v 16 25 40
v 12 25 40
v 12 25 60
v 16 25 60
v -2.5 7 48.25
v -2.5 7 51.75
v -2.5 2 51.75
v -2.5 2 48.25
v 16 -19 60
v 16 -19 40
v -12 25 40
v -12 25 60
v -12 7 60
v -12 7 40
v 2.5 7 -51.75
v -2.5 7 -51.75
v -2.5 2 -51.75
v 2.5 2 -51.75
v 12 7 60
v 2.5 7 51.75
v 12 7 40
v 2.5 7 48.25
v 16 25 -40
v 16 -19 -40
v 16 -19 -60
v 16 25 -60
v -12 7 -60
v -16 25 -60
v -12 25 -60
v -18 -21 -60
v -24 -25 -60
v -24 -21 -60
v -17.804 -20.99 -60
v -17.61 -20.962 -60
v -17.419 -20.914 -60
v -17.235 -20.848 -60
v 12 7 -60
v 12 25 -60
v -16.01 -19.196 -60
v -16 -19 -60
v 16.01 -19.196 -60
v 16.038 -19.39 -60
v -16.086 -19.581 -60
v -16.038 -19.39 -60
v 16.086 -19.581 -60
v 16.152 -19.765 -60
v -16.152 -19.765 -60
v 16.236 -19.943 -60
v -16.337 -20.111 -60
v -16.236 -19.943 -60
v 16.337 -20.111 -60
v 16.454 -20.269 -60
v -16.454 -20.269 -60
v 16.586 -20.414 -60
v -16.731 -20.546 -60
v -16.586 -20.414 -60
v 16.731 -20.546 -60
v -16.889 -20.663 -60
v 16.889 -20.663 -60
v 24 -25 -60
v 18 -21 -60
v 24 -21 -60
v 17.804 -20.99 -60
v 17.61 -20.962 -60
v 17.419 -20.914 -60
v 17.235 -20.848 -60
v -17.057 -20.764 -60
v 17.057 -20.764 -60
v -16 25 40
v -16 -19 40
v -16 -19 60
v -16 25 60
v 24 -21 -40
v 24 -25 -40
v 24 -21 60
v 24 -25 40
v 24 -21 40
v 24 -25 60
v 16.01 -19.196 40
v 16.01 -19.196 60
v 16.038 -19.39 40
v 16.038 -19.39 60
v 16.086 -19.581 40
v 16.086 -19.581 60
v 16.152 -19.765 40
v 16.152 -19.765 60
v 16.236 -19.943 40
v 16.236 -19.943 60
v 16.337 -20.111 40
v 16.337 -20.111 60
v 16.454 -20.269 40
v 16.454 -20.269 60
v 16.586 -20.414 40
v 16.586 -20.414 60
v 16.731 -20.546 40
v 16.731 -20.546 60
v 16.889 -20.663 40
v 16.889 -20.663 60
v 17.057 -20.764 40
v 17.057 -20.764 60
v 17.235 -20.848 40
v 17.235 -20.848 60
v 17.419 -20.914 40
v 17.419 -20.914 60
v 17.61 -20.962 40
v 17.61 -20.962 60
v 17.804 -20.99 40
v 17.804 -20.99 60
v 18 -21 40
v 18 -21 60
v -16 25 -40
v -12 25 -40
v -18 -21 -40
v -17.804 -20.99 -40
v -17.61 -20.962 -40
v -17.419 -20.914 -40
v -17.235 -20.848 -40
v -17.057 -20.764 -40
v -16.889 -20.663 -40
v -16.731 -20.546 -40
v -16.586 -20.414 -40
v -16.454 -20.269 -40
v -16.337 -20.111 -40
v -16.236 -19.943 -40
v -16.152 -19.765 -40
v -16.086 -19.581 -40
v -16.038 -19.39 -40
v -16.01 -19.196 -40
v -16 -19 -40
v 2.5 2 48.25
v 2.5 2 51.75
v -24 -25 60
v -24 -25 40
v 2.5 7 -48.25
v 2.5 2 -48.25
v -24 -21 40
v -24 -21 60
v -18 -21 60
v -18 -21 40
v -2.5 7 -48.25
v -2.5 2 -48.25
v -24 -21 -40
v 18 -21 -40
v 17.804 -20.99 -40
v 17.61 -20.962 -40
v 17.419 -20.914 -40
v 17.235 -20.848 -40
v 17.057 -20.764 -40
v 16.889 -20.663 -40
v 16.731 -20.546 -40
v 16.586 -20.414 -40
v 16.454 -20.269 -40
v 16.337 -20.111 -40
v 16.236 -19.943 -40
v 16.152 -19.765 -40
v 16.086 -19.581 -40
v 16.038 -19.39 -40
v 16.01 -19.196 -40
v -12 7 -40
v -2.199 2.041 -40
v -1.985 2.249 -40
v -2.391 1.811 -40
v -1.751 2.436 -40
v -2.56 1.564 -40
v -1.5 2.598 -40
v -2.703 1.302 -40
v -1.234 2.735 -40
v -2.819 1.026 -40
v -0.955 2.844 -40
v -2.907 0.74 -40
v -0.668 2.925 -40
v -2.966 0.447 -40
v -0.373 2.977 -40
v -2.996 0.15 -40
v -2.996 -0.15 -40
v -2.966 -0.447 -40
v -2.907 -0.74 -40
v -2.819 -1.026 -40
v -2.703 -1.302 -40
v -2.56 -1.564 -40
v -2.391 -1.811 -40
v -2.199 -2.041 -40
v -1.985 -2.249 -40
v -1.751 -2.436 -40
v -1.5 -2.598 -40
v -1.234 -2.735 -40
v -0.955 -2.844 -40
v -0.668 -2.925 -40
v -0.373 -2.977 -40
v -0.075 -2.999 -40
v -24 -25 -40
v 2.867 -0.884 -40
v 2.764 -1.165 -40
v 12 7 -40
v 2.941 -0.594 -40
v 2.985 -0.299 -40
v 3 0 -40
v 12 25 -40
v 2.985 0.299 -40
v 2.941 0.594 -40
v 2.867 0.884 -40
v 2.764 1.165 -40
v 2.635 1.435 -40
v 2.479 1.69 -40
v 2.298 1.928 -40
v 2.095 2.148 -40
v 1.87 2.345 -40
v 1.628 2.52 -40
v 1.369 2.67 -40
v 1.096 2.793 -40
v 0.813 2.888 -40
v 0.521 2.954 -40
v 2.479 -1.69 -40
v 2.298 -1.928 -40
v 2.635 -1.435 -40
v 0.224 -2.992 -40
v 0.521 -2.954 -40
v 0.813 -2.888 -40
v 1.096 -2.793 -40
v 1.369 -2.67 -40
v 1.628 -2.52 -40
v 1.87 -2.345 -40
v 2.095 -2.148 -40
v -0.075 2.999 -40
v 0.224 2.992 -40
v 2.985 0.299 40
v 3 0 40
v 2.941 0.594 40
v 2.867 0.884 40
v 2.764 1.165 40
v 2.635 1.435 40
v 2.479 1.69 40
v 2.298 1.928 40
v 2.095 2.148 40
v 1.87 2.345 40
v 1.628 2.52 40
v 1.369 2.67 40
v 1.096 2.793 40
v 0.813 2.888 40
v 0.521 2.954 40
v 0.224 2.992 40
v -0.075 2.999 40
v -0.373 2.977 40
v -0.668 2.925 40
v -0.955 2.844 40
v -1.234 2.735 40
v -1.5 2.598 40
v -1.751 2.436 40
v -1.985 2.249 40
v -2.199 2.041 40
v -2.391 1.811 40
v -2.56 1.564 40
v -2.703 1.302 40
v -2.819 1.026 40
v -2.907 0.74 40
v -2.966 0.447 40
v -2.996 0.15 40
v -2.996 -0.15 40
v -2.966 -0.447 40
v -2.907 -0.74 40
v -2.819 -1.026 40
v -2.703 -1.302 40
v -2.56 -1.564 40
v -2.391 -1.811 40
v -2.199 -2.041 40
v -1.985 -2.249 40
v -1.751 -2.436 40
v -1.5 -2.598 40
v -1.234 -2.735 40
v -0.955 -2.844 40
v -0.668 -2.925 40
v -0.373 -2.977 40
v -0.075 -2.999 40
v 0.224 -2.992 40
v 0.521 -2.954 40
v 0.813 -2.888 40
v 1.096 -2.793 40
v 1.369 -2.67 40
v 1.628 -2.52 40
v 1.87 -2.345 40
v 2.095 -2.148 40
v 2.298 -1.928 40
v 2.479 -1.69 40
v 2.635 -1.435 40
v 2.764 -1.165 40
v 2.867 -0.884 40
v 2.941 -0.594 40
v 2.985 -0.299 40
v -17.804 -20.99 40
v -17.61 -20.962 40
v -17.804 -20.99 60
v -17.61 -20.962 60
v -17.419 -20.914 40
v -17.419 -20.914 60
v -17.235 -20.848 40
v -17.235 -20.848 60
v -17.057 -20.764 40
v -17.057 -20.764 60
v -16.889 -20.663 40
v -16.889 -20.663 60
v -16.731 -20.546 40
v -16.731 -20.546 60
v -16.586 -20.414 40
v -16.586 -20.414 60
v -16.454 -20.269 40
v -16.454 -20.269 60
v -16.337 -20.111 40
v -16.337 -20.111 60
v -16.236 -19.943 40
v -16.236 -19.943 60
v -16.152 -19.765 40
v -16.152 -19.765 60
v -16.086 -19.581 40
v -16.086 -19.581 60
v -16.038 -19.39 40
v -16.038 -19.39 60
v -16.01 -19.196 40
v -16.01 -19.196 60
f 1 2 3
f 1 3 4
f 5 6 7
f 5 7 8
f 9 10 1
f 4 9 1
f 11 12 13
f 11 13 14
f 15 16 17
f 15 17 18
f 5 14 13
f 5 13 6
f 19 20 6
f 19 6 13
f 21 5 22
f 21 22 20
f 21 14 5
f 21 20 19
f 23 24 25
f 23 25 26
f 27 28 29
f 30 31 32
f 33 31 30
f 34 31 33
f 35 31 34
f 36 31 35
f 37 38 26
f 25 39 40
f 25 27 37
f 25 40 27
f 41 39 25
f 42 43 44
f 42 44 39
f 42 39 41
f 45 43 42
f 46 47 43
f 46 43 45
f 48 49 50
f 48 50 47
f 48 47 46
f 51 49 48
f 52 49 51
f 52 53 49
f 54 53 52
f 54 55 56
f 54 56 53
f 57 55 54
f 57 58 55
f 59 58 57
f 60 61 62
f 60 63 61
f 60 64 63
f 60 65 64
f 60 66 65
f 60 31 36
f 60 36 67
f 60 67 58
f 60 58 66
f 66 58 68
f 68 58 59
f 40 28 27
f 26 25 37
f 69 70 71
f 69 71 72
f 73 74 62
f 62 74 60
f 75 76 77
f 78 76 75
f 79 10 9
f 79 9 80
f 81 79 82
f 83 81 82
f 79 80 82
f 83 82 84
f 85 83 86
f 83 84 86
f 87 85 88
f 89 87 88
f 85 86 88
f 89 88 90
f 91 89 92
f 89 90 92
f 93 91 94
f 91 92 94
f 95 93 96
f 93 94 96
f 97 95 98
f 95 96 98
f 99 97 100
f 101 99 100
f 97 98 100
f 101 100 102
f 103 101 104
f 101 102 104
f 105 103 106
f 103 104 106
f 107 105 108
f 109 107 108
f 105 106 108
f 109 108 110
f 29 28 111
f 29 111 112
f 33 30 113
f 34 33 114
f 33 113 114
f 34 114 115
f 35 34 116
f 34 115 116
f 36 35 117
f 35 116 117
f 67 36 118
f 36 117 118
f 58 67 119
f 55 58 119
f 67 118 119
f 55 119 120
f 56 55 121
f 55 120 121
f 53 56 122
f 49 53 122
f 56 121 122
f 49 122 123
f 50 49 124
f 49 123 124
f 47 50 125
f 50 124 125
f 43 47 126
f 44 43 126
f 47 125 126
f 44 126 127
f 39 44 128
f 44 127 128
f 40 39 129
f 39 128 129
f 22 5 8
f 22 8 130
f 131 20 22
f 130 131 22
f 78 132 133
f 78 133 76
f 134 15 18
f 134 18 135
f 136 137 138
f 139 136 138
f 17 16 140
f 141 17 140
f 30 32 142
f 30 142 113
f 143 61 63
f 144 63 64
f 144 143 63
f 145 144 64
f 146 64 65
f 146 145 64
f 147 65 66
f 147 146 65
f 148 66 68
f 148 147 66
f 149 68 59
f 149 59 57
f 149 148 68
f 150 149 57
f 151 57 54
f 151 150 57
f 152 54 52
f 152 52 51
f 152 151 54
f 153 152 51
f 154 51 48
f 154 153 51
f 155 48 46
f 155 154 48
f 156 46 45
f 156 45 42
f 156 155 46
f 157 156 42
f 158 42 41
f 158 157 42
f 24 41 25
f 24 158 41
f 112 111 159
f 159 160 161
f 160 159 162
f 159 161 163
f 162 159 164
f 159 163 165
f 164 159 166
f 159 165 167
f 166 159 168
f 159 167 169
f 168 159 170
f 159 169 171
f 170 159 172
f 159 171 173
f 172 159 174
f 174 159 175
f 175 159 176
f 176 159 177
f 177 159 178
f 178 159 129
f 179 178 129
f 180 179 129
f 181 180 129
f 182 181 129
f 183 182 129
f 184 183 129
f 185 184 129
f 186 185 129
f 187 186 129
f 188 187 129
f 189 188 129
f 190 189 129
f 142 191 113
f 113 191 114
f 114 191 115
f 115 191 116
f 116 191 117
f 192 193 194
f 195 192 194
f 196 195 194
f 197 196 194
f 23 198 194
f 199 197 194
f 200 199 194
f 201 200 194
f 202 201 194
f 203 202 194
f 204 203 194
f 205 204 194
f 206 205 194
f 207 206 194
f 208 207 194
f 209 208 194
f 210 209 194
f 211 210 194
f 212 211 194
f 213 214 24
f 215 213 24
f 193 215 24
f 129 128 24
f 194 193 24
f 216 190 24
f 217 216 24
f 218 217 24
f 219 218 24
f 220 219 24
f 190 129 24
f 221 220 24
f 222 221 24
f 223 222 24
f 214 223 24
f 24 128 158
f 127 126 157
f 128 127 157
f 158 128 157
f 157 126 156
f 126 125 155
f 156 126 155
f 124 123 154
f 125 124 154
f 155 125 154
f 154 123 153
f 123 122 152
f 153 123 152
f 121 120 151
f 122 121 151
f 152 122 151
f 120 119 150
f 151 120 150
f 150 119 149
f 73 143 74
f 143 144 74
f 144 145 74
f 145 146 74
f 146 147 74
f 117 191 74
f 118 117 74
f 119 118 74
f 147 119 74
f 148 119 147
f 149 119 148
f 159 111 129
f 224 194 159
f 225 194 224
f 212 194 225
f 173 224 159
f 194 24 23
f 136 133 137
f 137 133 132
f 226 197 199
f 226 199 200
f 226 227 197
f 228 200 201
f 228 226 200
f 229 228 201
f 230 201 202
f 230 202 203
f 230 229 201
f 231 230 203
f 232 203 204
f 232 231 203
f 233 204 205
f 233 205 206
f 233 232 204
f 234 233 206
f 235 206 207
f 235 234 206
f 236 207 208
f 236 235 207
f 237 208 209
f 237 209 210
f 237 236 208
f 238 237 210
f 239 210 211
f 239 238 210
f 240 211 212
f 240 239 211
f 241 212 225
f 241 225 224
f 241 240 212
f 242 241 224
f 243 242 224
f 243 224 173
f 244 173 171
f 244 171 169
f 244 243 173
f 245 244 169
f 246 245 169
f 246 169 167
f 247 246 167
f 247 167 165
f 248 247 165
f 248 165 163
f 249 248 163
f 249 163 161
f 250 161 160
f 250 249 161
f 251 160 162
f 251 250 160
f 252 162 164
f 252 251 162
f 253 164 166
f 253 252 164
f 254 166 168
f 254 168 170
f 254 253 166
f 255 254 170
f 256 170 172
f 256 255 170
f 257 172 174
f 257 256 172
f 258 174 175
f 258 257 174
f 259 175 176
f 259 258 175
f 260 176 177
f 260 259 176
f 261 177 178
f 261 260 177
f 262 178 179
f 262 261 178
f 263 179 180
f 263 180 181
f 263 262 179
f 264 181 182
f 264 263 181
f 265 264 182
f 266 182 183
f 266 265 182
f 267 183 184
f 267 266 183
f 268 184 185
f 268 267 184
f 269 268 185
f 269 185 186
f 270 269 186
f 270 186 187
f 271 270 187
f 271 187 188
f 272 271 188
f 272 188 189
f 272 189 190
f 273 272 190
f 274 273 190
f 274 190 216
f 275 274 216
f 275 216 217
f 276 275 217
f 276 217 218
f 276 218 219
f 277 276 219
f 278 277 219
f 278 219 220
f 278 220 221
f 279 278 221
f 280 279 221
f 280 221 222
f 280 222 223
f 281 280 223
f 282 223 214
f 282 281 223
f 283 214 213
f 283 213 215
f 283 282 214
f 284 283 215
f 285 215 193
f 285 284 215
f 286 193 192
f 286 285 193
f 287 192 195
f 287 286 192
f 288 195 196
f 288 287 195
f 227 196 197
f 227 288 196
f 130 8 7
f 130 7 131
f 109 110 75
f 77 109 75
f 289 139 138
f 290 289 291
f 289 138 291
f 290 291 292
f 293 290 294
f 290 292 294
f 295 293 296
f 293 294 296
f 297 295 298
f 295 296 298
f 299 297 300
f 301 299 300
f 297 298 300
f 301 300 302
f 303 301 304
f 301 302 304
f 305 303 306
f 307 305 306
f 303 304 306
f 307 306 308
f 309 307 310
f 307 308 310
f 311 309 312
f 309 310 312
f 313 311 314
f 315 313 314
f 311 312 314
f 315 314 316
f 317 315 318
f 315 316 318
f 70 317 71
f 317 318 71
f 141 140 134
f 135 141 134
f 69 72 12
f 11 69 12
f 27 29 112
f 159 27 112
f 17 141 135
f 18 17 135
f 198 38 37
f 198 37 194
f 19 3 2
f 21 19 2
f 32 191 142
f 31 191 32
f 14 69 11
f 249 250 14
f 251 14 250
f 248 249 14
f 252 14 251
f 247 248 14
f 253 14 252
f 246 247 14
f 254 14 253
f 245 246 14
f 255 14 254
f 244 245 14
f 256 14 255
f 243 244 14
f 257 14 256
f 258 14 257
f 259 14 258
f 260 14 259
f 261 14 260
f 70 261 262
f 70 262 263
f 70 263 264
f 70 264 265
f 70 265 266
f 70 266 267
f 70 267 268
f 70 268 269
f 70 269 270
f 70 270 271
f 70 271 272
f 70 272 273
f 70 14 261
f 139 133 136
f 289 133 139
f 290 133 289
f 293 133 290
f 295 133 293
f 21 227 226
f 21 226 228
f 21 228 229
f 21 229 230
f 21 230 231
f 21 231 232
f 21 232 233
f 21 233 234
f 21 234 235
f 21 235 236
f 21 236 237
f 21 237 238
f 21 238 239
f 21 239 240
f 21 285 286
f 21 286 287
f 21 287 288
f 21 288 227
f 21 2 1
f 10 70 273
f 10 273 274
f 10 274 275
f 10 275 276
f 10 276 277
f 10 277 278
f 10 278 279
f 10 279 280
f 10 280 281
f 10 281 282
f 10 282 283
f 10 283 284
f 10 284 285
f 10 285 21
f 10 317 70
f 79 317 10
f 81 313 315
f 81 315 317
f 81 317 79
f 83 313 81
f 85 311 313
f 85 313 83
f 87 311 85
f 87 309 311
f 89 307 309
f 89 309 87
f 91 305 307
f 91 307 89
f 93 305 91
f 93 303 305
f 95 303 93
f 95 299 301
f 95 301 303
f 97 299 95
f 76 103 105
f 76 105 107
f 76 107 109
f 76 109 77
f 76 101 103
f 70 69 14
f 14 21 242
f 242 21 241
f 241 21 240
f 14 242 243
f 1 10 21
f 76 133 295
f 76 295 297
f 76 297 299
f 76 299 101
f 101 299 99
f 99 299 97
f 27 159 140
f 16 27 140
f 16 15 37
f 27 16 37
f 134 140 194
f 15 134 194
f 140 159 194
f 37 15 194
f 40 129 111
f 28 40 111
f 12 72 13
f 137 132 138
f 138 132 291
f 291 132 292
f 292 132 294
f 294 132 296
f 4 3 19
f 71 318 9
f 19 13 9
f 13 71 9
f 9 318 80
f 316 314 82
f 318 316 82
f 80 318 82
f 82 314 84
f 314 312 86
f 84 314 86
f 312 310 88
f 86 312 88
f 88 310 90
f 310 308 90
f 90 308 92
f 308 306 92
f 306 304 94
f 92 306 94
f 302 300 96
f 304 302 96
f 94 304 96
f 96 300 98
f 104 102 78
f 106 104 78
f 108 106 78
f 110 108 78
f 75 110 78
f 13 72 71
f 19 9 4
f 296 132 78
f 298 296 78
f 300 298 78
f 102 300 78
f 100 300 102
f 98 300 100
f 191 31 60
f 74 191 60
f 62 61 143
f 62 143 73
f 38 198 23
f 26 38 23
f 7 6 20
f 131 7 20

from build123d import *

# Parameters (mm, degrees)
SKETCH1_R            = 3
BOSS_EXTRUDE1_DEPTH  = 40
SKETCH2_W            = 32
SKETCH2_H            = 50
BOSS_EXTRUDE2_DEPTH  = 20
SKETCH9_W            = 48
SKETCH9_H            = 20
BOSS_EXTRUDE5_DEPTH  = 4
FILLET1_R            = 2
SKETCH10_W           = 24
SKETCH10_H           = 20
CUT_EXTRUDE2_DEPTH   = 18
SKETCH11_W           = 5
SKETCH11_H           = 3.5
CUT_EXTRUDE3_DEPTH   = 5
FILLET1_OF_MIRROR5_R = 2


with BuildPart() as part:
    # Sketch1 → Boss-Extrude1 (new, symmetric)
    with BuildSketch(Plane.XY):
        Circle(SKETCH1_R)
    extrude(amount=BOSS_EXTRUDE1_DEPTH, both=True)

    # Sketch2 → Boss-Extrude2 (add)
    with BuildSketch(Plane.XY.offset(40)):
        Rectangle(SKETCH2_W, SKETCH2_H)
    boss_extrude2 = extrude(amount=BOSS_EXTRUDE2_DEPTH)

    # Sketch9 → Boss-Extrude5 (add)
    with BuildSketch(Plane.XZ.offset(25)):
        with Locations((0, 50)):
            Rectangle(SKETCH9_W, SKETCH9_H)
    boss_extrude5 = extrude(amount=-BOSS_EXTRUDE5_DEPTH)

    # Fillet1
    fillet1_edges = [part.edges().sort_by_distance(p)[0] for p in [
        (-16, -21, 50),
        (16, -21, 50),
    ]]
    fillet(fillet1_edges, radius=FILLET1_R)

    # Sketch10 → Cut-Extrude2 (cut)
    with BuildSketch(Plane(origin=(0, 25, 0), x_dir=(1, 0, 0), z_dir=(0, 1, 0))):
        with Locations((0, -50)):
            Rectangle(SKETCH10_W, SKETCH10_H)
    cut_extrude2 = extrude(amount=-CUT_EXTRUDE2_DEPTH, mode=Mode.SUBTRACT)

    # Sketch11 → Cut-Extrude3 (cut)
    with BuildSketch(Plane(origin=(0, 7, 0), x_dir=(1, 0, 0), z_dir=(0, 1, 0))):
        with Locations((0, -50)):
            Rectangle(SKETCH11_W, SKETCH11_H)
    cut_extrude3 = extrude(amount=-CUT_EXTRUDE3_DEPTH, mode=Mode.SUBTRACT)

    # Mirror5: Boss-Extrude2, Boss-Extrude5, Cut-Extrude2, Cut-Extrude3 across plane
    add(boss_extrude2.mirror(Plane.XY))
    add(boss_extrude5.mirror(Plane.XY))
    add(cut_extrude2.mirror(Plane.XY), mode=Mode.SUBTRACT)
    add(cut_extrude3.mirror(Plane.XY), mode=Mode.SUBTRACT)

    # Fillet1 of Mirror5
    fillet1_of_mirror5_edges = [part.edges().sort_by_distance(p)[0] for p in [
        (-16, -21, -50),
        (16, -21, -50),
    ]]
    fillet(fillet1_of_mirror5_edges, radius=FILLET1_OF_MIRROR5_R)


solid = part.part
